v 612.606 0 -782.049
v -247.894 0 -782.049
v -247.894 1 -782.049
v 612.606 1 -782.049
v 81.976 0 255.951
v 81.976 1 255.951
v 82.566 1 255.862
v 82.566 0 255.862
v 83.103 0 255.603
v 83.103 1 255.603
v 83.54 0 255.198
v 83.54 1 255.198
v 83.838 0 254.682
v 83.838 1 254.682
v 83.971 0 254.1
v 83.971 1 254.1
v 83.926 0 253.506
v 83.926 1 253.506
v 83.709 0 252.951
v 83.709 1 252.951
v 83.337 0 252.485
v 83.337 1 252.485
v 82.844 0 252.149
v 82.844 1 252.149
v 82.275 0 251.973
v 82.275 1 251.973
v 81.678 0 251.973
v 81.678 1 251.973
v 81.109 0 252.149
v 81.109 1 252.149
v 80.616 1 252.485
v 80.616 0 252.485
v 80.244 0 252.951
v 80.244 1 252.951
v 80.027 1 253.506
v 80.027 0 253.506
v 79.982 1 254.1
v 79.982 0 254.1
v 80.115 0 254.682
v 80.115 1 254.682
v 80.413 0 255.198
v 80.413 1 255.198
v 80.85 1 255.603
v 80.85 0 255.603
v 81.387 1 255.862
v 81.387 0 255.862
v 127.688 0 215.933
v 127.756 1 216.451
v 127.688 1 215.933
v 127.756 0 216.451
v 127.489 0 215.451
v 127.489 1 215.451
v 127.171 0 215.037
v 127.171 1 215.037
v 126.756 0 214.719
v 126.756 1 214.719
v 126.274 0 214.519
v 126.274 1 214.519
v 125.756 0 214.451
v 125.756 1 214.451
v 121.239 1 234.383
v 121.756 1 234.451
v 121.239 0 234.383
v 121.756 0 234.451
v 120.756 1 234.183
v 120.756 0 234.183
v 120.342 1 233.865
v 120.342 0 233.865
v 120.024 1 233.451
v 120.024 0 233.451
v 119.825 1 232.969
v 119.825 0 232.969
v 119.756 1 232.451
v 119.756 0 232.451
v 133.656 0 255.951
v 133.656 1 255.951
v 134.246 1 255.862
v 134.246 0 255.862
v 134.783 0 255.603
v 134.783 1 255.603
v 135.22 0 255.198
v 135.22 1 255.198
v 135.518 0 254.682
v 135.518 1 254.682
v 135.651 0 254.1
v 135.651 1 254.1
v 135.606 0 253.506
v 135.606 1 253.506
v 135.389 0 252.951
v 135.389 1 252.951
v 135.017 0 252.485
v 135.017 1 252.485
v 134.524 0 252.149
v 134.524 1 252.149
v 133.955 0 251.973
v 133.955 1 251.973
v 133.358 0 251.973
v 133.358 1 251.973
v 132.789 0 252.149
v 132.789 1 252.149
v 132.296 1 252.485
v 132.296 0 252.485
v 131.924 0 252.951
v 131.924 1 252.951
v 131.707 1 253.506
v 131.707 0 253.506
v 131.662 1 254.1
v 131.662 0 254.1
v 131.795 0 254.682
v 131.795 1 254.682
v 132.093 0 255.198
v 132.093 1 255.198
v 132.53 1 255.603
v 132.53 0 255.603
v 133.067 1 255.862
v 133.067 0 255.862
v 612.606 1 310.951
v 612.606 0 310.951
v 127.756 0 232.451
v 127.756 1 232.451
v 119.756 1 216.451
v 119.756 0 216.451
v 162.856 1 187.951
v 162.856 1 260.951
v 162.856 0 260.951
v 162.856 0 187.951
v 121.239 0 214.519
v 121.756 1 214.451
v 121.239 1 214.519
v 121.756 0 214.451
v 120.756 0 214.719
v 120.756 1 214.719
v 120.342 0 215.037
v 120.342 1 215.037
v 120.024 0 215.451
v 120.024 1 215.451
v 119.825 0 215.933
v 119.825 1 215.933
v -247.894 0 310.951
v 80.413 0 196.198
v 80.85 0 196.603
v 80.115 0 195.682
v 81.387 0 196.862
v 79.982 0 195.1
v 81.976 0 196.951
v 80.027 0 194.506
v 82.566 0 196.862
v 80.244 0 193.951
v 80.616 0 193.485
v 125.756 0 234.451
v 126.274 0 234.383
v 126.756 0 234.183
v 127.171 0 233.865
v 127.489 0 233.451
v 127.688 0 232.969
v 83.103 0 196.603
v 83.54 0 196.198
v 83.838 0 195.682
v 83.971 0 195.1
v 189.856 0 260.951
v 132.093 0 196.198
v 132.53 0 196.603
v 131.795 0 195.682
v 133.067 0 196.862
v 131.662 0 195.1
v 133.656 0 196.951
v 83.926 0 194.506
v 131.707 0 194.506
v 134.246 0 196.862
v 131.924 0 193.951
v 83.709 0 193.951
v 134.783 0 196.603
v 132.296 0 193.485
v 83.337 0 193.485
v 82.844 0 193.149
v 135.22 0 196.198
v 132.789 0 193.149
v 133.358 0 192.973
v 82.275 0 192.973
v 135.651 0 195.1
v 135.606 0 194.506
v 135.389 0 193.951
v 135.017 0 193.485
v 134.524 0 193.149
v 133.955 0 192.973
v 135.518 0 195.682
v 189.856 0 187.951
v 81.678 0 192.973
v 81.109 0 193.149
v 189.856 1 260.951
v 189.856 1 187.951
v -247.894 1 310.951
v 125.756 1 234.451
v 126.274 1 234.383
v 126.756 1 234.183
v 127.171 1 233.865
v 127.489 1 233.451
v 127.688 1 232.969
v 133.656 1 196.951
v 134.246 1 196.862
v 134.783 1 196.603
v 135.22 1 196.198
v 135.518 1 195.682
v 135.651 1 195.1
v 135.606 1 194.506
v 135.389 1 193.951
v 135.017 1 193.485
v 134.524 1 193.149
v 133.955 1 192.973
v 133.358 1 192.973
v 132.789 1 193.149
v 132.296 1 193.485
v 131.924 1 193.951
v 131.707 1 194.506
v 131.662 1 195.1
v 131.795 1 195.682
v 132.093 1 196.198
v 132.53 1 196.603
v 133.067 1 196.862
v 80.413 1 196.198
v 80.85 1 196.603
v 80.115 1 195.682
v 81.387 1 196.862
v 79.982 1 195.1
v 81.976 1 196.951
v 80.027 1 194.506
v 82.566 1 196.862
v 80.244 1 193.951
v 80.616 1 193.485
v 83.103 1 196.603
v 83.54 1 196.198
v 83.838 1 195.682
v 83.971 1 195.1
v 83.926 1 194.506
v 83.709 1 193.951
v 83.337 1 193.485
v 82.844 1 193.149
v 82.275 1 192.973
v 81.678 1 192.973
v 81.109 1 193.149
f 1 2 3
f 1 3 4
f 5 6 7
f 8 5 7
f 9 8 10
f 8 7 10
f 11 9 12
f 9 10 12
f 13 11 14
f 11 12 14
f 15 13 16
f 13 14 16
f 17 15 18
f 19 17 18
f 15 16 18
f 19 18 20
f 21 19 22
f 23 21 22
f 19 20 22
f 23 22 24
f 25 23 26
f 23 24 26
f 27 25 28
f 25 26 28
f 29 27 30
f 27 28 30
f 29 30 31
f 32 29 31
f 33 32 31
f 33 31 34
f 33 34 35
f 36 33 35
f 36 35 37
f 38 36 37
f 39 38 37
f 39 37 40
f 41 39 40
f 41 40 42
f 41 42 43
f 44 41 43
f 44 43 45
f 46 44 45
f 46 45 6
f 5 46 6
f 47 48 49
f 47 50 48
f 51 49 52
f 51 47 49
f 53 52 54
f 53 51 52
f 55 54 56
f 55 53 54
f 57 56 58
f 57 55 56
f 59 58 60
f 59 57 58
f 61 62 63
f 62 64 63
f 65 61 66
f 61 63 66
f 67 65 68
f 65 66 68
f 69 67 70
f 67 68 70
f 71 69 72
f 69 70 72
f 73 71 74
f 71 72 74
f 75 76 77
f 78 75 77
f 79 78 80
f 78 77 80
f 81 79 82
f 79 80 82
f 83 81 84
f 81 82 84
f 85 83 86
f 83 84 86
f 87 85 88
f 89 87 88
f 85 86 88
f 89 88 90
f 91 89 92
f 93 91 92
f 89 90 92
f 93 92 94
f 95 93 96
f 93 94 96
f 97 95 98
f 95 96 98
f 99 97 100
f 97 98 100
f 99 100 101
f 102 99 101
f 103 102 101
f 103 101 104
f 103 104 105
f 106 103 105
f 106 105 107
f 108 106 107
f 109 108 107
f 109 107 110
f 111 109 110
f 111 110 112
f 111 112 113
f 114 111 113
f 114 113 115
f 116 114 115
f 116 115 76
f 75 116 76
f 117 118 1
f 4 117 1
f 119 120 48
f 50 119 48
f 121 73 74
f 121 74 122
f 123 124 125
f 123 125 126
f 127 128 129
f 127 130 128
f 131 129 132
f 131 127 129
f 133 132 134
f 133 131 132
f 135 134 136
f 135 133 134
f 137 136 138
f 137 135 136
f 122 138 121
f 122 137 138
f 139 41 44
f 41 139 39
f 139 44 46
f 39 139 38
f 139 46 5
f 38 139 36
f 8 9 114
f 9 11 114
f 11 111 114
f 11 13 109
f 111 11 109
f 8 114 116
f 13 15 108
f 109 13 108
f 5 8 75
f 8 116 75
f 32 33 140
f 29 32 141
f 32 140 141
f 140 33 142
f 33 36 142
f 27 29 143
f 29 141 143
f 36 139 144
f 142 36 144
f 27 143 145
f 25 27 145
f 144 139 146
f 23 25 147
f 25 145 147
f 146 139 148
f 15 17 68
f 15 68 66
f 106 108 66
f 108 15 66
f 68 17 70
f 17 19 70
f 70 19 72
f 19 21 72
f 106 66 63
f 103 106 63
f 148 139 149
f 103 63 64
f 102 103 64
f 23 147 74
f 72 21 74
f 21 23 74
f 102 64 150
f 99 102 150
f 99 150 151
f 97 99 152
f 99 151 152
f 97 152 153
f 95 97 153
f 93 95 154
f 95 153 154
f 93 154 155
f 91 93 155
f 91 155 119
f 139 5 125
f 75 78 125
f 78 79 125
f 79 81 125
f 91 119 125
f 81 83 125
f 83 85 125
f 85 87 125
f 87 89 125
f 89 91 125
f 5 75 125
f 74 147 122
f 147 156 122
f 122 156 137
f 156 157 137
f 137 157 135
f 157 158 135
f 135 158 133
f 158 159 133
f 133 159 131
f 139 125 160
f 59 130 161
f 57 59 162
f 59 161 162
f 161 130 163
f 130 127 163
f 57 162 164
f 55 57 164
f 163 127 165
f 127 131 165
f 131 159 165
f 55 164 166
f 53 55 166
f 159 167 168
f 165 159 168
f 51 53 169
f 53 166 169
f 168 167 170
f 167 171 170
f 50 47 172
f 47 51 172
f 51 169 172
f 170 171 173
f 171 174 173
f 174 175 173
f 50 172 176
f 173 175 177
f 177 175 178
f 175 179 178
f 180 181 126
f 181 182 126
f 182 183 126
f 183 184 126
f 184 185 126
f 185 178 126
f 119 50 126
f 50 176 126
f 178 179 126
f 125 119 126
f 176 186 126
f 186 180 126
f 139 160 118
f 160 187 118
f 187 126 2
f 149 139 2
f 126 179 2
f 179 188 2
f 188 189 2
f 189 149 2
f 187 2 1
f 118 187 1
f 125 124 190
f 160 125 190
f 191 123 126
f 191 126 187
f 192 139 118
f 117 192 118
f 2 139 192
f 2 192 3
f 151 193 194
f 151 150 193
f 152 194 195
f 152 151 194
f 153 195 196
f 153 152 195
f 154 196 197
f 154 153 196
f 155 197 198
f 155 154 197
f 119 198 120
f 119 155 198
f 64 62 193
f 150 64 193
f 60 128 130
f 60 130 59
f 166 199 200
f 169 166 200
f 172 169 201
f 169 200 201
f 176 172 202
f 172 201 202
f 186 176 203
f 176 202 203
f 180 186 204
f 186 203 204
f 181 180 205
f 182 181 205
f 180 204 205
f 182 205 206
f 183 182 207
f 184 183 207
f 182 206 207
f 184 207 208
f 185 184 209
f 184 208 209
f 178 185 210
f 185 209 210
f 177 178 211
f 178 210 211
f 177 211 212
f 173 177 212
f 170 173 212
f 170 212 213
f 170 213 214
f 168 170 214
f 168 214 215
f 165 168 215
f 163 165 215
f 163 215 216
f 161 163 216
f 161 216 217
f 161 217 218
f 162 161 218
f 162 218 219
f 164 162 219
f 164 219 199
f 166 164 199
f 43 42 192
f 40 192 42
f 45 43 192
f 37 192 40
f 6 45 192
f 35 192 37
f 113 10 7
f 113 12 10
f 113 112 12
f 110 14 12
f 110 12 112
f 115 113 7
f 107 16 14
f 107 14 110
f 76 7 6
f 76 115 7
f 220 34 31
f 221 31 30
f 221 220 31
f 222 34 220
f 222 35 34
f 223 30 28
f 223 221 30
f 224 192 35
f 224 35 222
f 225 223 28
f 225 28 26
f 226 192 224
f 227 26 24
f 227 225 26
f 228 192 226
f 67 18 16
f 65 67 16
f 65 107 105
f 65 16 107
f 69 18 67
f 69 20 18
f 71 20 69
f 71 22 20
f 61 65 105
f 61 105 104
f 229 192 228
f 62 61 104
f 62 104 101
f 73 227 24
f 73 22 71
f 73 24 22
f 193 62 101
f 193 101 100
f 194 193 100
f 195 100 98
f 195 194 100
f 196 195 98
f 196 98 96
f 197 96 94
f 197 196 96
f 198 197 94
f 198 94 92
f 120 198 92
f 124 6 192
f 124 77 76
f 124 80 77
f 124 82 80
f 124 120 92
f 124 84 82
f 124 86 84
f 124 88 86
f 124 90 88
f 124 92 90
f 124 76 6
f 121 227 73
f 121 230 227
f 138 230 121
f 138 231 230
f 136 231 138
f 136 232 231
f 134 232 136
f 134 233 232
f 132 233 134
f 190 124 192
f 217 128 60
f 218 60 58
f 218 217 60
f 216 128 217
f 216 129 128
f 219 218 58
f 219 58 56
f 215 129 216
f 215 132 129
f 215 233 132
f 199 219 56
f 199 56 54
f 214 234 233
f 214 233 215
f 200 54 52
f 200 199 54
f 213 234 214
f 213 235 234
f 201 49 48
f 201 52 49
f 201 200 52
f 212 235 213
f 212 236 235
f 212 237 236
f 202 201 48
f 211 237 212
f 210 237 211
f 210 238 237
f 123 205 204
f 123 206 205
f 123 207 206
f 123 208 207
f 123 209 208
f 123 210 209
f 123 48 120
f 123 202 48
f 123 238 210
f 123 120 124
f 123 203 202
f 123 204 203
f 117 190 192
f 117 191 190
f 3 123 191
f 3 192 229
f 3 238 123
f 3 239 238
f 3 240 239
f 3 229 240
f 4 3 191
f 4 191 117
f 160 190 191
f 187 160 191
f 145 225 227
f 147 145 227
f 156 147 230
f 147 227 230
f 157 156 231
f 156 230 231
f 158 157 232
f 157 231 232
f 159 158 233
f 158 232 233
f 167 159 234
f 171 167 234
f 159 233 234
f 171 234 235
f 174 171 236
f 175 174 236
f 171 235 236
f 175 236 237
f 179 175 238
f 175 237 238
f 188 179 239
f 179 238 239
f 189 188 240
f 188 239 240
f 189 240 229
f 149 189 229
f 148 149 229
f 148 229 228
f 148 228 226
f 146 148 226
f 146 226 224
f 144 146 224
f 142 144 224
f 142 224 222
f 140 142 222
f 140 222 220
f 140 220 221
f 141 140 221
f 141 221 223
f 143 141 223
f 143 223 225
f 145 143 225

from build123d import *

# Parameters (mm, degrees)
SKETCH1_W           = 860.5
SKETCH1_H           = 1093
BOSS_EXTRUDE1_DEPTH = 1
SKETCH2_W           = 27
SKETCH2_H           = 73
CUT_EXTRUDE1_DEPTH  = 1
SKETCH3_R           = 2
CUT_EXTRUDE2_DEPTH  = 994.422535961
SKETCH4_W           = 8
SKETCH4_H           = 20
CUT_EXTRUDE3_DEPTH  = 1
FILLET1_R           = 2


with BuildPart() as part:
    # Sketch1 → Boss-Extrude1 (new body)
    with BuildSketch(Plane(origin=(0, 0, 0), x_dir=(1, 0, 0), z_dir=(0, 1, 0))):
        with Locations((182.356476286, 235.549001129)):
            Rectangle(SKETCH1_W, SKETCH1_H)
    extrude(amount=BOSS_EXTRUDE1_DEPTH)

    # Sketch2 → Cut-Extrude1 (cut)
    with BuildSketch(Plane(origin=(0, 1, 0), x_dir=(1, 0, 0), z_dir=(0, 1, 0))):
        with Locations((176.356476286, -224.450998871)):
            Rectangle(SKETCH2_W, SKETCH2_H)
    extrude(amount=-CUT_EXTRUDE1_DEPTH, mode=Mode.SUBTRACT)

    # Sketch3 → Cut-Extrude2 (cut, through all)
    with BuildSketch(Plane(origin=(0, 1, 0), x_dir=(1, 0, 0), z_dir=(0, 1, 0))):
        with Locations(Location((133.656476286, -194.950998871, 0), (0, 0, 270))):
            Circle(SKETCH3_R)
        with Locations(Location((133.656476286, -253.950998871, 0), (0, 0, 270))):
            Circle(SKETCH3_R)
        with Locations(Location((81.976476286, -194.950998871, 0), (0, 0, 270))):
            Circle(SKETCH3_R)
        with Locations(Location((81.976476286, -253.950998871, 0), (0, 0, 270))):
            Circle(SKETCH3_R)
    extrude(amount=-CUT_EXTRUDE2_DEPTH, mode=Mode.SUBTRACT)

    # Sketch4 → Cut-Extrude3 (cut)
    with BuildSketch(Plane(origin=(0, 1, 0), x_dir=(1, 0, 0), z_dir=(0, 1, 0))):
        with Locations((123.756476286, -224.450998871)):
            Rectangle(SKETCH4_W, SKETCH4_H)
    extrude(amount=-CUT_EXTRUDE3_DEPTH, mode=Mode.SUBTRACT)

    # Fillet1
    fillet1_edges = [part.edges().sort_by_distance(p)[0] for p in [
        (127.756476286, 0.5, 214.450998871),
        (127.756476286, 0.5, 234.450998871),
        (119.756476286, 0.5, 234.450998871),
        (119.756476286, 0.5, 214.450998871),
    ]]
    fillet(fillet1_edges, radius=FILLET1_R)


solid = part.part
